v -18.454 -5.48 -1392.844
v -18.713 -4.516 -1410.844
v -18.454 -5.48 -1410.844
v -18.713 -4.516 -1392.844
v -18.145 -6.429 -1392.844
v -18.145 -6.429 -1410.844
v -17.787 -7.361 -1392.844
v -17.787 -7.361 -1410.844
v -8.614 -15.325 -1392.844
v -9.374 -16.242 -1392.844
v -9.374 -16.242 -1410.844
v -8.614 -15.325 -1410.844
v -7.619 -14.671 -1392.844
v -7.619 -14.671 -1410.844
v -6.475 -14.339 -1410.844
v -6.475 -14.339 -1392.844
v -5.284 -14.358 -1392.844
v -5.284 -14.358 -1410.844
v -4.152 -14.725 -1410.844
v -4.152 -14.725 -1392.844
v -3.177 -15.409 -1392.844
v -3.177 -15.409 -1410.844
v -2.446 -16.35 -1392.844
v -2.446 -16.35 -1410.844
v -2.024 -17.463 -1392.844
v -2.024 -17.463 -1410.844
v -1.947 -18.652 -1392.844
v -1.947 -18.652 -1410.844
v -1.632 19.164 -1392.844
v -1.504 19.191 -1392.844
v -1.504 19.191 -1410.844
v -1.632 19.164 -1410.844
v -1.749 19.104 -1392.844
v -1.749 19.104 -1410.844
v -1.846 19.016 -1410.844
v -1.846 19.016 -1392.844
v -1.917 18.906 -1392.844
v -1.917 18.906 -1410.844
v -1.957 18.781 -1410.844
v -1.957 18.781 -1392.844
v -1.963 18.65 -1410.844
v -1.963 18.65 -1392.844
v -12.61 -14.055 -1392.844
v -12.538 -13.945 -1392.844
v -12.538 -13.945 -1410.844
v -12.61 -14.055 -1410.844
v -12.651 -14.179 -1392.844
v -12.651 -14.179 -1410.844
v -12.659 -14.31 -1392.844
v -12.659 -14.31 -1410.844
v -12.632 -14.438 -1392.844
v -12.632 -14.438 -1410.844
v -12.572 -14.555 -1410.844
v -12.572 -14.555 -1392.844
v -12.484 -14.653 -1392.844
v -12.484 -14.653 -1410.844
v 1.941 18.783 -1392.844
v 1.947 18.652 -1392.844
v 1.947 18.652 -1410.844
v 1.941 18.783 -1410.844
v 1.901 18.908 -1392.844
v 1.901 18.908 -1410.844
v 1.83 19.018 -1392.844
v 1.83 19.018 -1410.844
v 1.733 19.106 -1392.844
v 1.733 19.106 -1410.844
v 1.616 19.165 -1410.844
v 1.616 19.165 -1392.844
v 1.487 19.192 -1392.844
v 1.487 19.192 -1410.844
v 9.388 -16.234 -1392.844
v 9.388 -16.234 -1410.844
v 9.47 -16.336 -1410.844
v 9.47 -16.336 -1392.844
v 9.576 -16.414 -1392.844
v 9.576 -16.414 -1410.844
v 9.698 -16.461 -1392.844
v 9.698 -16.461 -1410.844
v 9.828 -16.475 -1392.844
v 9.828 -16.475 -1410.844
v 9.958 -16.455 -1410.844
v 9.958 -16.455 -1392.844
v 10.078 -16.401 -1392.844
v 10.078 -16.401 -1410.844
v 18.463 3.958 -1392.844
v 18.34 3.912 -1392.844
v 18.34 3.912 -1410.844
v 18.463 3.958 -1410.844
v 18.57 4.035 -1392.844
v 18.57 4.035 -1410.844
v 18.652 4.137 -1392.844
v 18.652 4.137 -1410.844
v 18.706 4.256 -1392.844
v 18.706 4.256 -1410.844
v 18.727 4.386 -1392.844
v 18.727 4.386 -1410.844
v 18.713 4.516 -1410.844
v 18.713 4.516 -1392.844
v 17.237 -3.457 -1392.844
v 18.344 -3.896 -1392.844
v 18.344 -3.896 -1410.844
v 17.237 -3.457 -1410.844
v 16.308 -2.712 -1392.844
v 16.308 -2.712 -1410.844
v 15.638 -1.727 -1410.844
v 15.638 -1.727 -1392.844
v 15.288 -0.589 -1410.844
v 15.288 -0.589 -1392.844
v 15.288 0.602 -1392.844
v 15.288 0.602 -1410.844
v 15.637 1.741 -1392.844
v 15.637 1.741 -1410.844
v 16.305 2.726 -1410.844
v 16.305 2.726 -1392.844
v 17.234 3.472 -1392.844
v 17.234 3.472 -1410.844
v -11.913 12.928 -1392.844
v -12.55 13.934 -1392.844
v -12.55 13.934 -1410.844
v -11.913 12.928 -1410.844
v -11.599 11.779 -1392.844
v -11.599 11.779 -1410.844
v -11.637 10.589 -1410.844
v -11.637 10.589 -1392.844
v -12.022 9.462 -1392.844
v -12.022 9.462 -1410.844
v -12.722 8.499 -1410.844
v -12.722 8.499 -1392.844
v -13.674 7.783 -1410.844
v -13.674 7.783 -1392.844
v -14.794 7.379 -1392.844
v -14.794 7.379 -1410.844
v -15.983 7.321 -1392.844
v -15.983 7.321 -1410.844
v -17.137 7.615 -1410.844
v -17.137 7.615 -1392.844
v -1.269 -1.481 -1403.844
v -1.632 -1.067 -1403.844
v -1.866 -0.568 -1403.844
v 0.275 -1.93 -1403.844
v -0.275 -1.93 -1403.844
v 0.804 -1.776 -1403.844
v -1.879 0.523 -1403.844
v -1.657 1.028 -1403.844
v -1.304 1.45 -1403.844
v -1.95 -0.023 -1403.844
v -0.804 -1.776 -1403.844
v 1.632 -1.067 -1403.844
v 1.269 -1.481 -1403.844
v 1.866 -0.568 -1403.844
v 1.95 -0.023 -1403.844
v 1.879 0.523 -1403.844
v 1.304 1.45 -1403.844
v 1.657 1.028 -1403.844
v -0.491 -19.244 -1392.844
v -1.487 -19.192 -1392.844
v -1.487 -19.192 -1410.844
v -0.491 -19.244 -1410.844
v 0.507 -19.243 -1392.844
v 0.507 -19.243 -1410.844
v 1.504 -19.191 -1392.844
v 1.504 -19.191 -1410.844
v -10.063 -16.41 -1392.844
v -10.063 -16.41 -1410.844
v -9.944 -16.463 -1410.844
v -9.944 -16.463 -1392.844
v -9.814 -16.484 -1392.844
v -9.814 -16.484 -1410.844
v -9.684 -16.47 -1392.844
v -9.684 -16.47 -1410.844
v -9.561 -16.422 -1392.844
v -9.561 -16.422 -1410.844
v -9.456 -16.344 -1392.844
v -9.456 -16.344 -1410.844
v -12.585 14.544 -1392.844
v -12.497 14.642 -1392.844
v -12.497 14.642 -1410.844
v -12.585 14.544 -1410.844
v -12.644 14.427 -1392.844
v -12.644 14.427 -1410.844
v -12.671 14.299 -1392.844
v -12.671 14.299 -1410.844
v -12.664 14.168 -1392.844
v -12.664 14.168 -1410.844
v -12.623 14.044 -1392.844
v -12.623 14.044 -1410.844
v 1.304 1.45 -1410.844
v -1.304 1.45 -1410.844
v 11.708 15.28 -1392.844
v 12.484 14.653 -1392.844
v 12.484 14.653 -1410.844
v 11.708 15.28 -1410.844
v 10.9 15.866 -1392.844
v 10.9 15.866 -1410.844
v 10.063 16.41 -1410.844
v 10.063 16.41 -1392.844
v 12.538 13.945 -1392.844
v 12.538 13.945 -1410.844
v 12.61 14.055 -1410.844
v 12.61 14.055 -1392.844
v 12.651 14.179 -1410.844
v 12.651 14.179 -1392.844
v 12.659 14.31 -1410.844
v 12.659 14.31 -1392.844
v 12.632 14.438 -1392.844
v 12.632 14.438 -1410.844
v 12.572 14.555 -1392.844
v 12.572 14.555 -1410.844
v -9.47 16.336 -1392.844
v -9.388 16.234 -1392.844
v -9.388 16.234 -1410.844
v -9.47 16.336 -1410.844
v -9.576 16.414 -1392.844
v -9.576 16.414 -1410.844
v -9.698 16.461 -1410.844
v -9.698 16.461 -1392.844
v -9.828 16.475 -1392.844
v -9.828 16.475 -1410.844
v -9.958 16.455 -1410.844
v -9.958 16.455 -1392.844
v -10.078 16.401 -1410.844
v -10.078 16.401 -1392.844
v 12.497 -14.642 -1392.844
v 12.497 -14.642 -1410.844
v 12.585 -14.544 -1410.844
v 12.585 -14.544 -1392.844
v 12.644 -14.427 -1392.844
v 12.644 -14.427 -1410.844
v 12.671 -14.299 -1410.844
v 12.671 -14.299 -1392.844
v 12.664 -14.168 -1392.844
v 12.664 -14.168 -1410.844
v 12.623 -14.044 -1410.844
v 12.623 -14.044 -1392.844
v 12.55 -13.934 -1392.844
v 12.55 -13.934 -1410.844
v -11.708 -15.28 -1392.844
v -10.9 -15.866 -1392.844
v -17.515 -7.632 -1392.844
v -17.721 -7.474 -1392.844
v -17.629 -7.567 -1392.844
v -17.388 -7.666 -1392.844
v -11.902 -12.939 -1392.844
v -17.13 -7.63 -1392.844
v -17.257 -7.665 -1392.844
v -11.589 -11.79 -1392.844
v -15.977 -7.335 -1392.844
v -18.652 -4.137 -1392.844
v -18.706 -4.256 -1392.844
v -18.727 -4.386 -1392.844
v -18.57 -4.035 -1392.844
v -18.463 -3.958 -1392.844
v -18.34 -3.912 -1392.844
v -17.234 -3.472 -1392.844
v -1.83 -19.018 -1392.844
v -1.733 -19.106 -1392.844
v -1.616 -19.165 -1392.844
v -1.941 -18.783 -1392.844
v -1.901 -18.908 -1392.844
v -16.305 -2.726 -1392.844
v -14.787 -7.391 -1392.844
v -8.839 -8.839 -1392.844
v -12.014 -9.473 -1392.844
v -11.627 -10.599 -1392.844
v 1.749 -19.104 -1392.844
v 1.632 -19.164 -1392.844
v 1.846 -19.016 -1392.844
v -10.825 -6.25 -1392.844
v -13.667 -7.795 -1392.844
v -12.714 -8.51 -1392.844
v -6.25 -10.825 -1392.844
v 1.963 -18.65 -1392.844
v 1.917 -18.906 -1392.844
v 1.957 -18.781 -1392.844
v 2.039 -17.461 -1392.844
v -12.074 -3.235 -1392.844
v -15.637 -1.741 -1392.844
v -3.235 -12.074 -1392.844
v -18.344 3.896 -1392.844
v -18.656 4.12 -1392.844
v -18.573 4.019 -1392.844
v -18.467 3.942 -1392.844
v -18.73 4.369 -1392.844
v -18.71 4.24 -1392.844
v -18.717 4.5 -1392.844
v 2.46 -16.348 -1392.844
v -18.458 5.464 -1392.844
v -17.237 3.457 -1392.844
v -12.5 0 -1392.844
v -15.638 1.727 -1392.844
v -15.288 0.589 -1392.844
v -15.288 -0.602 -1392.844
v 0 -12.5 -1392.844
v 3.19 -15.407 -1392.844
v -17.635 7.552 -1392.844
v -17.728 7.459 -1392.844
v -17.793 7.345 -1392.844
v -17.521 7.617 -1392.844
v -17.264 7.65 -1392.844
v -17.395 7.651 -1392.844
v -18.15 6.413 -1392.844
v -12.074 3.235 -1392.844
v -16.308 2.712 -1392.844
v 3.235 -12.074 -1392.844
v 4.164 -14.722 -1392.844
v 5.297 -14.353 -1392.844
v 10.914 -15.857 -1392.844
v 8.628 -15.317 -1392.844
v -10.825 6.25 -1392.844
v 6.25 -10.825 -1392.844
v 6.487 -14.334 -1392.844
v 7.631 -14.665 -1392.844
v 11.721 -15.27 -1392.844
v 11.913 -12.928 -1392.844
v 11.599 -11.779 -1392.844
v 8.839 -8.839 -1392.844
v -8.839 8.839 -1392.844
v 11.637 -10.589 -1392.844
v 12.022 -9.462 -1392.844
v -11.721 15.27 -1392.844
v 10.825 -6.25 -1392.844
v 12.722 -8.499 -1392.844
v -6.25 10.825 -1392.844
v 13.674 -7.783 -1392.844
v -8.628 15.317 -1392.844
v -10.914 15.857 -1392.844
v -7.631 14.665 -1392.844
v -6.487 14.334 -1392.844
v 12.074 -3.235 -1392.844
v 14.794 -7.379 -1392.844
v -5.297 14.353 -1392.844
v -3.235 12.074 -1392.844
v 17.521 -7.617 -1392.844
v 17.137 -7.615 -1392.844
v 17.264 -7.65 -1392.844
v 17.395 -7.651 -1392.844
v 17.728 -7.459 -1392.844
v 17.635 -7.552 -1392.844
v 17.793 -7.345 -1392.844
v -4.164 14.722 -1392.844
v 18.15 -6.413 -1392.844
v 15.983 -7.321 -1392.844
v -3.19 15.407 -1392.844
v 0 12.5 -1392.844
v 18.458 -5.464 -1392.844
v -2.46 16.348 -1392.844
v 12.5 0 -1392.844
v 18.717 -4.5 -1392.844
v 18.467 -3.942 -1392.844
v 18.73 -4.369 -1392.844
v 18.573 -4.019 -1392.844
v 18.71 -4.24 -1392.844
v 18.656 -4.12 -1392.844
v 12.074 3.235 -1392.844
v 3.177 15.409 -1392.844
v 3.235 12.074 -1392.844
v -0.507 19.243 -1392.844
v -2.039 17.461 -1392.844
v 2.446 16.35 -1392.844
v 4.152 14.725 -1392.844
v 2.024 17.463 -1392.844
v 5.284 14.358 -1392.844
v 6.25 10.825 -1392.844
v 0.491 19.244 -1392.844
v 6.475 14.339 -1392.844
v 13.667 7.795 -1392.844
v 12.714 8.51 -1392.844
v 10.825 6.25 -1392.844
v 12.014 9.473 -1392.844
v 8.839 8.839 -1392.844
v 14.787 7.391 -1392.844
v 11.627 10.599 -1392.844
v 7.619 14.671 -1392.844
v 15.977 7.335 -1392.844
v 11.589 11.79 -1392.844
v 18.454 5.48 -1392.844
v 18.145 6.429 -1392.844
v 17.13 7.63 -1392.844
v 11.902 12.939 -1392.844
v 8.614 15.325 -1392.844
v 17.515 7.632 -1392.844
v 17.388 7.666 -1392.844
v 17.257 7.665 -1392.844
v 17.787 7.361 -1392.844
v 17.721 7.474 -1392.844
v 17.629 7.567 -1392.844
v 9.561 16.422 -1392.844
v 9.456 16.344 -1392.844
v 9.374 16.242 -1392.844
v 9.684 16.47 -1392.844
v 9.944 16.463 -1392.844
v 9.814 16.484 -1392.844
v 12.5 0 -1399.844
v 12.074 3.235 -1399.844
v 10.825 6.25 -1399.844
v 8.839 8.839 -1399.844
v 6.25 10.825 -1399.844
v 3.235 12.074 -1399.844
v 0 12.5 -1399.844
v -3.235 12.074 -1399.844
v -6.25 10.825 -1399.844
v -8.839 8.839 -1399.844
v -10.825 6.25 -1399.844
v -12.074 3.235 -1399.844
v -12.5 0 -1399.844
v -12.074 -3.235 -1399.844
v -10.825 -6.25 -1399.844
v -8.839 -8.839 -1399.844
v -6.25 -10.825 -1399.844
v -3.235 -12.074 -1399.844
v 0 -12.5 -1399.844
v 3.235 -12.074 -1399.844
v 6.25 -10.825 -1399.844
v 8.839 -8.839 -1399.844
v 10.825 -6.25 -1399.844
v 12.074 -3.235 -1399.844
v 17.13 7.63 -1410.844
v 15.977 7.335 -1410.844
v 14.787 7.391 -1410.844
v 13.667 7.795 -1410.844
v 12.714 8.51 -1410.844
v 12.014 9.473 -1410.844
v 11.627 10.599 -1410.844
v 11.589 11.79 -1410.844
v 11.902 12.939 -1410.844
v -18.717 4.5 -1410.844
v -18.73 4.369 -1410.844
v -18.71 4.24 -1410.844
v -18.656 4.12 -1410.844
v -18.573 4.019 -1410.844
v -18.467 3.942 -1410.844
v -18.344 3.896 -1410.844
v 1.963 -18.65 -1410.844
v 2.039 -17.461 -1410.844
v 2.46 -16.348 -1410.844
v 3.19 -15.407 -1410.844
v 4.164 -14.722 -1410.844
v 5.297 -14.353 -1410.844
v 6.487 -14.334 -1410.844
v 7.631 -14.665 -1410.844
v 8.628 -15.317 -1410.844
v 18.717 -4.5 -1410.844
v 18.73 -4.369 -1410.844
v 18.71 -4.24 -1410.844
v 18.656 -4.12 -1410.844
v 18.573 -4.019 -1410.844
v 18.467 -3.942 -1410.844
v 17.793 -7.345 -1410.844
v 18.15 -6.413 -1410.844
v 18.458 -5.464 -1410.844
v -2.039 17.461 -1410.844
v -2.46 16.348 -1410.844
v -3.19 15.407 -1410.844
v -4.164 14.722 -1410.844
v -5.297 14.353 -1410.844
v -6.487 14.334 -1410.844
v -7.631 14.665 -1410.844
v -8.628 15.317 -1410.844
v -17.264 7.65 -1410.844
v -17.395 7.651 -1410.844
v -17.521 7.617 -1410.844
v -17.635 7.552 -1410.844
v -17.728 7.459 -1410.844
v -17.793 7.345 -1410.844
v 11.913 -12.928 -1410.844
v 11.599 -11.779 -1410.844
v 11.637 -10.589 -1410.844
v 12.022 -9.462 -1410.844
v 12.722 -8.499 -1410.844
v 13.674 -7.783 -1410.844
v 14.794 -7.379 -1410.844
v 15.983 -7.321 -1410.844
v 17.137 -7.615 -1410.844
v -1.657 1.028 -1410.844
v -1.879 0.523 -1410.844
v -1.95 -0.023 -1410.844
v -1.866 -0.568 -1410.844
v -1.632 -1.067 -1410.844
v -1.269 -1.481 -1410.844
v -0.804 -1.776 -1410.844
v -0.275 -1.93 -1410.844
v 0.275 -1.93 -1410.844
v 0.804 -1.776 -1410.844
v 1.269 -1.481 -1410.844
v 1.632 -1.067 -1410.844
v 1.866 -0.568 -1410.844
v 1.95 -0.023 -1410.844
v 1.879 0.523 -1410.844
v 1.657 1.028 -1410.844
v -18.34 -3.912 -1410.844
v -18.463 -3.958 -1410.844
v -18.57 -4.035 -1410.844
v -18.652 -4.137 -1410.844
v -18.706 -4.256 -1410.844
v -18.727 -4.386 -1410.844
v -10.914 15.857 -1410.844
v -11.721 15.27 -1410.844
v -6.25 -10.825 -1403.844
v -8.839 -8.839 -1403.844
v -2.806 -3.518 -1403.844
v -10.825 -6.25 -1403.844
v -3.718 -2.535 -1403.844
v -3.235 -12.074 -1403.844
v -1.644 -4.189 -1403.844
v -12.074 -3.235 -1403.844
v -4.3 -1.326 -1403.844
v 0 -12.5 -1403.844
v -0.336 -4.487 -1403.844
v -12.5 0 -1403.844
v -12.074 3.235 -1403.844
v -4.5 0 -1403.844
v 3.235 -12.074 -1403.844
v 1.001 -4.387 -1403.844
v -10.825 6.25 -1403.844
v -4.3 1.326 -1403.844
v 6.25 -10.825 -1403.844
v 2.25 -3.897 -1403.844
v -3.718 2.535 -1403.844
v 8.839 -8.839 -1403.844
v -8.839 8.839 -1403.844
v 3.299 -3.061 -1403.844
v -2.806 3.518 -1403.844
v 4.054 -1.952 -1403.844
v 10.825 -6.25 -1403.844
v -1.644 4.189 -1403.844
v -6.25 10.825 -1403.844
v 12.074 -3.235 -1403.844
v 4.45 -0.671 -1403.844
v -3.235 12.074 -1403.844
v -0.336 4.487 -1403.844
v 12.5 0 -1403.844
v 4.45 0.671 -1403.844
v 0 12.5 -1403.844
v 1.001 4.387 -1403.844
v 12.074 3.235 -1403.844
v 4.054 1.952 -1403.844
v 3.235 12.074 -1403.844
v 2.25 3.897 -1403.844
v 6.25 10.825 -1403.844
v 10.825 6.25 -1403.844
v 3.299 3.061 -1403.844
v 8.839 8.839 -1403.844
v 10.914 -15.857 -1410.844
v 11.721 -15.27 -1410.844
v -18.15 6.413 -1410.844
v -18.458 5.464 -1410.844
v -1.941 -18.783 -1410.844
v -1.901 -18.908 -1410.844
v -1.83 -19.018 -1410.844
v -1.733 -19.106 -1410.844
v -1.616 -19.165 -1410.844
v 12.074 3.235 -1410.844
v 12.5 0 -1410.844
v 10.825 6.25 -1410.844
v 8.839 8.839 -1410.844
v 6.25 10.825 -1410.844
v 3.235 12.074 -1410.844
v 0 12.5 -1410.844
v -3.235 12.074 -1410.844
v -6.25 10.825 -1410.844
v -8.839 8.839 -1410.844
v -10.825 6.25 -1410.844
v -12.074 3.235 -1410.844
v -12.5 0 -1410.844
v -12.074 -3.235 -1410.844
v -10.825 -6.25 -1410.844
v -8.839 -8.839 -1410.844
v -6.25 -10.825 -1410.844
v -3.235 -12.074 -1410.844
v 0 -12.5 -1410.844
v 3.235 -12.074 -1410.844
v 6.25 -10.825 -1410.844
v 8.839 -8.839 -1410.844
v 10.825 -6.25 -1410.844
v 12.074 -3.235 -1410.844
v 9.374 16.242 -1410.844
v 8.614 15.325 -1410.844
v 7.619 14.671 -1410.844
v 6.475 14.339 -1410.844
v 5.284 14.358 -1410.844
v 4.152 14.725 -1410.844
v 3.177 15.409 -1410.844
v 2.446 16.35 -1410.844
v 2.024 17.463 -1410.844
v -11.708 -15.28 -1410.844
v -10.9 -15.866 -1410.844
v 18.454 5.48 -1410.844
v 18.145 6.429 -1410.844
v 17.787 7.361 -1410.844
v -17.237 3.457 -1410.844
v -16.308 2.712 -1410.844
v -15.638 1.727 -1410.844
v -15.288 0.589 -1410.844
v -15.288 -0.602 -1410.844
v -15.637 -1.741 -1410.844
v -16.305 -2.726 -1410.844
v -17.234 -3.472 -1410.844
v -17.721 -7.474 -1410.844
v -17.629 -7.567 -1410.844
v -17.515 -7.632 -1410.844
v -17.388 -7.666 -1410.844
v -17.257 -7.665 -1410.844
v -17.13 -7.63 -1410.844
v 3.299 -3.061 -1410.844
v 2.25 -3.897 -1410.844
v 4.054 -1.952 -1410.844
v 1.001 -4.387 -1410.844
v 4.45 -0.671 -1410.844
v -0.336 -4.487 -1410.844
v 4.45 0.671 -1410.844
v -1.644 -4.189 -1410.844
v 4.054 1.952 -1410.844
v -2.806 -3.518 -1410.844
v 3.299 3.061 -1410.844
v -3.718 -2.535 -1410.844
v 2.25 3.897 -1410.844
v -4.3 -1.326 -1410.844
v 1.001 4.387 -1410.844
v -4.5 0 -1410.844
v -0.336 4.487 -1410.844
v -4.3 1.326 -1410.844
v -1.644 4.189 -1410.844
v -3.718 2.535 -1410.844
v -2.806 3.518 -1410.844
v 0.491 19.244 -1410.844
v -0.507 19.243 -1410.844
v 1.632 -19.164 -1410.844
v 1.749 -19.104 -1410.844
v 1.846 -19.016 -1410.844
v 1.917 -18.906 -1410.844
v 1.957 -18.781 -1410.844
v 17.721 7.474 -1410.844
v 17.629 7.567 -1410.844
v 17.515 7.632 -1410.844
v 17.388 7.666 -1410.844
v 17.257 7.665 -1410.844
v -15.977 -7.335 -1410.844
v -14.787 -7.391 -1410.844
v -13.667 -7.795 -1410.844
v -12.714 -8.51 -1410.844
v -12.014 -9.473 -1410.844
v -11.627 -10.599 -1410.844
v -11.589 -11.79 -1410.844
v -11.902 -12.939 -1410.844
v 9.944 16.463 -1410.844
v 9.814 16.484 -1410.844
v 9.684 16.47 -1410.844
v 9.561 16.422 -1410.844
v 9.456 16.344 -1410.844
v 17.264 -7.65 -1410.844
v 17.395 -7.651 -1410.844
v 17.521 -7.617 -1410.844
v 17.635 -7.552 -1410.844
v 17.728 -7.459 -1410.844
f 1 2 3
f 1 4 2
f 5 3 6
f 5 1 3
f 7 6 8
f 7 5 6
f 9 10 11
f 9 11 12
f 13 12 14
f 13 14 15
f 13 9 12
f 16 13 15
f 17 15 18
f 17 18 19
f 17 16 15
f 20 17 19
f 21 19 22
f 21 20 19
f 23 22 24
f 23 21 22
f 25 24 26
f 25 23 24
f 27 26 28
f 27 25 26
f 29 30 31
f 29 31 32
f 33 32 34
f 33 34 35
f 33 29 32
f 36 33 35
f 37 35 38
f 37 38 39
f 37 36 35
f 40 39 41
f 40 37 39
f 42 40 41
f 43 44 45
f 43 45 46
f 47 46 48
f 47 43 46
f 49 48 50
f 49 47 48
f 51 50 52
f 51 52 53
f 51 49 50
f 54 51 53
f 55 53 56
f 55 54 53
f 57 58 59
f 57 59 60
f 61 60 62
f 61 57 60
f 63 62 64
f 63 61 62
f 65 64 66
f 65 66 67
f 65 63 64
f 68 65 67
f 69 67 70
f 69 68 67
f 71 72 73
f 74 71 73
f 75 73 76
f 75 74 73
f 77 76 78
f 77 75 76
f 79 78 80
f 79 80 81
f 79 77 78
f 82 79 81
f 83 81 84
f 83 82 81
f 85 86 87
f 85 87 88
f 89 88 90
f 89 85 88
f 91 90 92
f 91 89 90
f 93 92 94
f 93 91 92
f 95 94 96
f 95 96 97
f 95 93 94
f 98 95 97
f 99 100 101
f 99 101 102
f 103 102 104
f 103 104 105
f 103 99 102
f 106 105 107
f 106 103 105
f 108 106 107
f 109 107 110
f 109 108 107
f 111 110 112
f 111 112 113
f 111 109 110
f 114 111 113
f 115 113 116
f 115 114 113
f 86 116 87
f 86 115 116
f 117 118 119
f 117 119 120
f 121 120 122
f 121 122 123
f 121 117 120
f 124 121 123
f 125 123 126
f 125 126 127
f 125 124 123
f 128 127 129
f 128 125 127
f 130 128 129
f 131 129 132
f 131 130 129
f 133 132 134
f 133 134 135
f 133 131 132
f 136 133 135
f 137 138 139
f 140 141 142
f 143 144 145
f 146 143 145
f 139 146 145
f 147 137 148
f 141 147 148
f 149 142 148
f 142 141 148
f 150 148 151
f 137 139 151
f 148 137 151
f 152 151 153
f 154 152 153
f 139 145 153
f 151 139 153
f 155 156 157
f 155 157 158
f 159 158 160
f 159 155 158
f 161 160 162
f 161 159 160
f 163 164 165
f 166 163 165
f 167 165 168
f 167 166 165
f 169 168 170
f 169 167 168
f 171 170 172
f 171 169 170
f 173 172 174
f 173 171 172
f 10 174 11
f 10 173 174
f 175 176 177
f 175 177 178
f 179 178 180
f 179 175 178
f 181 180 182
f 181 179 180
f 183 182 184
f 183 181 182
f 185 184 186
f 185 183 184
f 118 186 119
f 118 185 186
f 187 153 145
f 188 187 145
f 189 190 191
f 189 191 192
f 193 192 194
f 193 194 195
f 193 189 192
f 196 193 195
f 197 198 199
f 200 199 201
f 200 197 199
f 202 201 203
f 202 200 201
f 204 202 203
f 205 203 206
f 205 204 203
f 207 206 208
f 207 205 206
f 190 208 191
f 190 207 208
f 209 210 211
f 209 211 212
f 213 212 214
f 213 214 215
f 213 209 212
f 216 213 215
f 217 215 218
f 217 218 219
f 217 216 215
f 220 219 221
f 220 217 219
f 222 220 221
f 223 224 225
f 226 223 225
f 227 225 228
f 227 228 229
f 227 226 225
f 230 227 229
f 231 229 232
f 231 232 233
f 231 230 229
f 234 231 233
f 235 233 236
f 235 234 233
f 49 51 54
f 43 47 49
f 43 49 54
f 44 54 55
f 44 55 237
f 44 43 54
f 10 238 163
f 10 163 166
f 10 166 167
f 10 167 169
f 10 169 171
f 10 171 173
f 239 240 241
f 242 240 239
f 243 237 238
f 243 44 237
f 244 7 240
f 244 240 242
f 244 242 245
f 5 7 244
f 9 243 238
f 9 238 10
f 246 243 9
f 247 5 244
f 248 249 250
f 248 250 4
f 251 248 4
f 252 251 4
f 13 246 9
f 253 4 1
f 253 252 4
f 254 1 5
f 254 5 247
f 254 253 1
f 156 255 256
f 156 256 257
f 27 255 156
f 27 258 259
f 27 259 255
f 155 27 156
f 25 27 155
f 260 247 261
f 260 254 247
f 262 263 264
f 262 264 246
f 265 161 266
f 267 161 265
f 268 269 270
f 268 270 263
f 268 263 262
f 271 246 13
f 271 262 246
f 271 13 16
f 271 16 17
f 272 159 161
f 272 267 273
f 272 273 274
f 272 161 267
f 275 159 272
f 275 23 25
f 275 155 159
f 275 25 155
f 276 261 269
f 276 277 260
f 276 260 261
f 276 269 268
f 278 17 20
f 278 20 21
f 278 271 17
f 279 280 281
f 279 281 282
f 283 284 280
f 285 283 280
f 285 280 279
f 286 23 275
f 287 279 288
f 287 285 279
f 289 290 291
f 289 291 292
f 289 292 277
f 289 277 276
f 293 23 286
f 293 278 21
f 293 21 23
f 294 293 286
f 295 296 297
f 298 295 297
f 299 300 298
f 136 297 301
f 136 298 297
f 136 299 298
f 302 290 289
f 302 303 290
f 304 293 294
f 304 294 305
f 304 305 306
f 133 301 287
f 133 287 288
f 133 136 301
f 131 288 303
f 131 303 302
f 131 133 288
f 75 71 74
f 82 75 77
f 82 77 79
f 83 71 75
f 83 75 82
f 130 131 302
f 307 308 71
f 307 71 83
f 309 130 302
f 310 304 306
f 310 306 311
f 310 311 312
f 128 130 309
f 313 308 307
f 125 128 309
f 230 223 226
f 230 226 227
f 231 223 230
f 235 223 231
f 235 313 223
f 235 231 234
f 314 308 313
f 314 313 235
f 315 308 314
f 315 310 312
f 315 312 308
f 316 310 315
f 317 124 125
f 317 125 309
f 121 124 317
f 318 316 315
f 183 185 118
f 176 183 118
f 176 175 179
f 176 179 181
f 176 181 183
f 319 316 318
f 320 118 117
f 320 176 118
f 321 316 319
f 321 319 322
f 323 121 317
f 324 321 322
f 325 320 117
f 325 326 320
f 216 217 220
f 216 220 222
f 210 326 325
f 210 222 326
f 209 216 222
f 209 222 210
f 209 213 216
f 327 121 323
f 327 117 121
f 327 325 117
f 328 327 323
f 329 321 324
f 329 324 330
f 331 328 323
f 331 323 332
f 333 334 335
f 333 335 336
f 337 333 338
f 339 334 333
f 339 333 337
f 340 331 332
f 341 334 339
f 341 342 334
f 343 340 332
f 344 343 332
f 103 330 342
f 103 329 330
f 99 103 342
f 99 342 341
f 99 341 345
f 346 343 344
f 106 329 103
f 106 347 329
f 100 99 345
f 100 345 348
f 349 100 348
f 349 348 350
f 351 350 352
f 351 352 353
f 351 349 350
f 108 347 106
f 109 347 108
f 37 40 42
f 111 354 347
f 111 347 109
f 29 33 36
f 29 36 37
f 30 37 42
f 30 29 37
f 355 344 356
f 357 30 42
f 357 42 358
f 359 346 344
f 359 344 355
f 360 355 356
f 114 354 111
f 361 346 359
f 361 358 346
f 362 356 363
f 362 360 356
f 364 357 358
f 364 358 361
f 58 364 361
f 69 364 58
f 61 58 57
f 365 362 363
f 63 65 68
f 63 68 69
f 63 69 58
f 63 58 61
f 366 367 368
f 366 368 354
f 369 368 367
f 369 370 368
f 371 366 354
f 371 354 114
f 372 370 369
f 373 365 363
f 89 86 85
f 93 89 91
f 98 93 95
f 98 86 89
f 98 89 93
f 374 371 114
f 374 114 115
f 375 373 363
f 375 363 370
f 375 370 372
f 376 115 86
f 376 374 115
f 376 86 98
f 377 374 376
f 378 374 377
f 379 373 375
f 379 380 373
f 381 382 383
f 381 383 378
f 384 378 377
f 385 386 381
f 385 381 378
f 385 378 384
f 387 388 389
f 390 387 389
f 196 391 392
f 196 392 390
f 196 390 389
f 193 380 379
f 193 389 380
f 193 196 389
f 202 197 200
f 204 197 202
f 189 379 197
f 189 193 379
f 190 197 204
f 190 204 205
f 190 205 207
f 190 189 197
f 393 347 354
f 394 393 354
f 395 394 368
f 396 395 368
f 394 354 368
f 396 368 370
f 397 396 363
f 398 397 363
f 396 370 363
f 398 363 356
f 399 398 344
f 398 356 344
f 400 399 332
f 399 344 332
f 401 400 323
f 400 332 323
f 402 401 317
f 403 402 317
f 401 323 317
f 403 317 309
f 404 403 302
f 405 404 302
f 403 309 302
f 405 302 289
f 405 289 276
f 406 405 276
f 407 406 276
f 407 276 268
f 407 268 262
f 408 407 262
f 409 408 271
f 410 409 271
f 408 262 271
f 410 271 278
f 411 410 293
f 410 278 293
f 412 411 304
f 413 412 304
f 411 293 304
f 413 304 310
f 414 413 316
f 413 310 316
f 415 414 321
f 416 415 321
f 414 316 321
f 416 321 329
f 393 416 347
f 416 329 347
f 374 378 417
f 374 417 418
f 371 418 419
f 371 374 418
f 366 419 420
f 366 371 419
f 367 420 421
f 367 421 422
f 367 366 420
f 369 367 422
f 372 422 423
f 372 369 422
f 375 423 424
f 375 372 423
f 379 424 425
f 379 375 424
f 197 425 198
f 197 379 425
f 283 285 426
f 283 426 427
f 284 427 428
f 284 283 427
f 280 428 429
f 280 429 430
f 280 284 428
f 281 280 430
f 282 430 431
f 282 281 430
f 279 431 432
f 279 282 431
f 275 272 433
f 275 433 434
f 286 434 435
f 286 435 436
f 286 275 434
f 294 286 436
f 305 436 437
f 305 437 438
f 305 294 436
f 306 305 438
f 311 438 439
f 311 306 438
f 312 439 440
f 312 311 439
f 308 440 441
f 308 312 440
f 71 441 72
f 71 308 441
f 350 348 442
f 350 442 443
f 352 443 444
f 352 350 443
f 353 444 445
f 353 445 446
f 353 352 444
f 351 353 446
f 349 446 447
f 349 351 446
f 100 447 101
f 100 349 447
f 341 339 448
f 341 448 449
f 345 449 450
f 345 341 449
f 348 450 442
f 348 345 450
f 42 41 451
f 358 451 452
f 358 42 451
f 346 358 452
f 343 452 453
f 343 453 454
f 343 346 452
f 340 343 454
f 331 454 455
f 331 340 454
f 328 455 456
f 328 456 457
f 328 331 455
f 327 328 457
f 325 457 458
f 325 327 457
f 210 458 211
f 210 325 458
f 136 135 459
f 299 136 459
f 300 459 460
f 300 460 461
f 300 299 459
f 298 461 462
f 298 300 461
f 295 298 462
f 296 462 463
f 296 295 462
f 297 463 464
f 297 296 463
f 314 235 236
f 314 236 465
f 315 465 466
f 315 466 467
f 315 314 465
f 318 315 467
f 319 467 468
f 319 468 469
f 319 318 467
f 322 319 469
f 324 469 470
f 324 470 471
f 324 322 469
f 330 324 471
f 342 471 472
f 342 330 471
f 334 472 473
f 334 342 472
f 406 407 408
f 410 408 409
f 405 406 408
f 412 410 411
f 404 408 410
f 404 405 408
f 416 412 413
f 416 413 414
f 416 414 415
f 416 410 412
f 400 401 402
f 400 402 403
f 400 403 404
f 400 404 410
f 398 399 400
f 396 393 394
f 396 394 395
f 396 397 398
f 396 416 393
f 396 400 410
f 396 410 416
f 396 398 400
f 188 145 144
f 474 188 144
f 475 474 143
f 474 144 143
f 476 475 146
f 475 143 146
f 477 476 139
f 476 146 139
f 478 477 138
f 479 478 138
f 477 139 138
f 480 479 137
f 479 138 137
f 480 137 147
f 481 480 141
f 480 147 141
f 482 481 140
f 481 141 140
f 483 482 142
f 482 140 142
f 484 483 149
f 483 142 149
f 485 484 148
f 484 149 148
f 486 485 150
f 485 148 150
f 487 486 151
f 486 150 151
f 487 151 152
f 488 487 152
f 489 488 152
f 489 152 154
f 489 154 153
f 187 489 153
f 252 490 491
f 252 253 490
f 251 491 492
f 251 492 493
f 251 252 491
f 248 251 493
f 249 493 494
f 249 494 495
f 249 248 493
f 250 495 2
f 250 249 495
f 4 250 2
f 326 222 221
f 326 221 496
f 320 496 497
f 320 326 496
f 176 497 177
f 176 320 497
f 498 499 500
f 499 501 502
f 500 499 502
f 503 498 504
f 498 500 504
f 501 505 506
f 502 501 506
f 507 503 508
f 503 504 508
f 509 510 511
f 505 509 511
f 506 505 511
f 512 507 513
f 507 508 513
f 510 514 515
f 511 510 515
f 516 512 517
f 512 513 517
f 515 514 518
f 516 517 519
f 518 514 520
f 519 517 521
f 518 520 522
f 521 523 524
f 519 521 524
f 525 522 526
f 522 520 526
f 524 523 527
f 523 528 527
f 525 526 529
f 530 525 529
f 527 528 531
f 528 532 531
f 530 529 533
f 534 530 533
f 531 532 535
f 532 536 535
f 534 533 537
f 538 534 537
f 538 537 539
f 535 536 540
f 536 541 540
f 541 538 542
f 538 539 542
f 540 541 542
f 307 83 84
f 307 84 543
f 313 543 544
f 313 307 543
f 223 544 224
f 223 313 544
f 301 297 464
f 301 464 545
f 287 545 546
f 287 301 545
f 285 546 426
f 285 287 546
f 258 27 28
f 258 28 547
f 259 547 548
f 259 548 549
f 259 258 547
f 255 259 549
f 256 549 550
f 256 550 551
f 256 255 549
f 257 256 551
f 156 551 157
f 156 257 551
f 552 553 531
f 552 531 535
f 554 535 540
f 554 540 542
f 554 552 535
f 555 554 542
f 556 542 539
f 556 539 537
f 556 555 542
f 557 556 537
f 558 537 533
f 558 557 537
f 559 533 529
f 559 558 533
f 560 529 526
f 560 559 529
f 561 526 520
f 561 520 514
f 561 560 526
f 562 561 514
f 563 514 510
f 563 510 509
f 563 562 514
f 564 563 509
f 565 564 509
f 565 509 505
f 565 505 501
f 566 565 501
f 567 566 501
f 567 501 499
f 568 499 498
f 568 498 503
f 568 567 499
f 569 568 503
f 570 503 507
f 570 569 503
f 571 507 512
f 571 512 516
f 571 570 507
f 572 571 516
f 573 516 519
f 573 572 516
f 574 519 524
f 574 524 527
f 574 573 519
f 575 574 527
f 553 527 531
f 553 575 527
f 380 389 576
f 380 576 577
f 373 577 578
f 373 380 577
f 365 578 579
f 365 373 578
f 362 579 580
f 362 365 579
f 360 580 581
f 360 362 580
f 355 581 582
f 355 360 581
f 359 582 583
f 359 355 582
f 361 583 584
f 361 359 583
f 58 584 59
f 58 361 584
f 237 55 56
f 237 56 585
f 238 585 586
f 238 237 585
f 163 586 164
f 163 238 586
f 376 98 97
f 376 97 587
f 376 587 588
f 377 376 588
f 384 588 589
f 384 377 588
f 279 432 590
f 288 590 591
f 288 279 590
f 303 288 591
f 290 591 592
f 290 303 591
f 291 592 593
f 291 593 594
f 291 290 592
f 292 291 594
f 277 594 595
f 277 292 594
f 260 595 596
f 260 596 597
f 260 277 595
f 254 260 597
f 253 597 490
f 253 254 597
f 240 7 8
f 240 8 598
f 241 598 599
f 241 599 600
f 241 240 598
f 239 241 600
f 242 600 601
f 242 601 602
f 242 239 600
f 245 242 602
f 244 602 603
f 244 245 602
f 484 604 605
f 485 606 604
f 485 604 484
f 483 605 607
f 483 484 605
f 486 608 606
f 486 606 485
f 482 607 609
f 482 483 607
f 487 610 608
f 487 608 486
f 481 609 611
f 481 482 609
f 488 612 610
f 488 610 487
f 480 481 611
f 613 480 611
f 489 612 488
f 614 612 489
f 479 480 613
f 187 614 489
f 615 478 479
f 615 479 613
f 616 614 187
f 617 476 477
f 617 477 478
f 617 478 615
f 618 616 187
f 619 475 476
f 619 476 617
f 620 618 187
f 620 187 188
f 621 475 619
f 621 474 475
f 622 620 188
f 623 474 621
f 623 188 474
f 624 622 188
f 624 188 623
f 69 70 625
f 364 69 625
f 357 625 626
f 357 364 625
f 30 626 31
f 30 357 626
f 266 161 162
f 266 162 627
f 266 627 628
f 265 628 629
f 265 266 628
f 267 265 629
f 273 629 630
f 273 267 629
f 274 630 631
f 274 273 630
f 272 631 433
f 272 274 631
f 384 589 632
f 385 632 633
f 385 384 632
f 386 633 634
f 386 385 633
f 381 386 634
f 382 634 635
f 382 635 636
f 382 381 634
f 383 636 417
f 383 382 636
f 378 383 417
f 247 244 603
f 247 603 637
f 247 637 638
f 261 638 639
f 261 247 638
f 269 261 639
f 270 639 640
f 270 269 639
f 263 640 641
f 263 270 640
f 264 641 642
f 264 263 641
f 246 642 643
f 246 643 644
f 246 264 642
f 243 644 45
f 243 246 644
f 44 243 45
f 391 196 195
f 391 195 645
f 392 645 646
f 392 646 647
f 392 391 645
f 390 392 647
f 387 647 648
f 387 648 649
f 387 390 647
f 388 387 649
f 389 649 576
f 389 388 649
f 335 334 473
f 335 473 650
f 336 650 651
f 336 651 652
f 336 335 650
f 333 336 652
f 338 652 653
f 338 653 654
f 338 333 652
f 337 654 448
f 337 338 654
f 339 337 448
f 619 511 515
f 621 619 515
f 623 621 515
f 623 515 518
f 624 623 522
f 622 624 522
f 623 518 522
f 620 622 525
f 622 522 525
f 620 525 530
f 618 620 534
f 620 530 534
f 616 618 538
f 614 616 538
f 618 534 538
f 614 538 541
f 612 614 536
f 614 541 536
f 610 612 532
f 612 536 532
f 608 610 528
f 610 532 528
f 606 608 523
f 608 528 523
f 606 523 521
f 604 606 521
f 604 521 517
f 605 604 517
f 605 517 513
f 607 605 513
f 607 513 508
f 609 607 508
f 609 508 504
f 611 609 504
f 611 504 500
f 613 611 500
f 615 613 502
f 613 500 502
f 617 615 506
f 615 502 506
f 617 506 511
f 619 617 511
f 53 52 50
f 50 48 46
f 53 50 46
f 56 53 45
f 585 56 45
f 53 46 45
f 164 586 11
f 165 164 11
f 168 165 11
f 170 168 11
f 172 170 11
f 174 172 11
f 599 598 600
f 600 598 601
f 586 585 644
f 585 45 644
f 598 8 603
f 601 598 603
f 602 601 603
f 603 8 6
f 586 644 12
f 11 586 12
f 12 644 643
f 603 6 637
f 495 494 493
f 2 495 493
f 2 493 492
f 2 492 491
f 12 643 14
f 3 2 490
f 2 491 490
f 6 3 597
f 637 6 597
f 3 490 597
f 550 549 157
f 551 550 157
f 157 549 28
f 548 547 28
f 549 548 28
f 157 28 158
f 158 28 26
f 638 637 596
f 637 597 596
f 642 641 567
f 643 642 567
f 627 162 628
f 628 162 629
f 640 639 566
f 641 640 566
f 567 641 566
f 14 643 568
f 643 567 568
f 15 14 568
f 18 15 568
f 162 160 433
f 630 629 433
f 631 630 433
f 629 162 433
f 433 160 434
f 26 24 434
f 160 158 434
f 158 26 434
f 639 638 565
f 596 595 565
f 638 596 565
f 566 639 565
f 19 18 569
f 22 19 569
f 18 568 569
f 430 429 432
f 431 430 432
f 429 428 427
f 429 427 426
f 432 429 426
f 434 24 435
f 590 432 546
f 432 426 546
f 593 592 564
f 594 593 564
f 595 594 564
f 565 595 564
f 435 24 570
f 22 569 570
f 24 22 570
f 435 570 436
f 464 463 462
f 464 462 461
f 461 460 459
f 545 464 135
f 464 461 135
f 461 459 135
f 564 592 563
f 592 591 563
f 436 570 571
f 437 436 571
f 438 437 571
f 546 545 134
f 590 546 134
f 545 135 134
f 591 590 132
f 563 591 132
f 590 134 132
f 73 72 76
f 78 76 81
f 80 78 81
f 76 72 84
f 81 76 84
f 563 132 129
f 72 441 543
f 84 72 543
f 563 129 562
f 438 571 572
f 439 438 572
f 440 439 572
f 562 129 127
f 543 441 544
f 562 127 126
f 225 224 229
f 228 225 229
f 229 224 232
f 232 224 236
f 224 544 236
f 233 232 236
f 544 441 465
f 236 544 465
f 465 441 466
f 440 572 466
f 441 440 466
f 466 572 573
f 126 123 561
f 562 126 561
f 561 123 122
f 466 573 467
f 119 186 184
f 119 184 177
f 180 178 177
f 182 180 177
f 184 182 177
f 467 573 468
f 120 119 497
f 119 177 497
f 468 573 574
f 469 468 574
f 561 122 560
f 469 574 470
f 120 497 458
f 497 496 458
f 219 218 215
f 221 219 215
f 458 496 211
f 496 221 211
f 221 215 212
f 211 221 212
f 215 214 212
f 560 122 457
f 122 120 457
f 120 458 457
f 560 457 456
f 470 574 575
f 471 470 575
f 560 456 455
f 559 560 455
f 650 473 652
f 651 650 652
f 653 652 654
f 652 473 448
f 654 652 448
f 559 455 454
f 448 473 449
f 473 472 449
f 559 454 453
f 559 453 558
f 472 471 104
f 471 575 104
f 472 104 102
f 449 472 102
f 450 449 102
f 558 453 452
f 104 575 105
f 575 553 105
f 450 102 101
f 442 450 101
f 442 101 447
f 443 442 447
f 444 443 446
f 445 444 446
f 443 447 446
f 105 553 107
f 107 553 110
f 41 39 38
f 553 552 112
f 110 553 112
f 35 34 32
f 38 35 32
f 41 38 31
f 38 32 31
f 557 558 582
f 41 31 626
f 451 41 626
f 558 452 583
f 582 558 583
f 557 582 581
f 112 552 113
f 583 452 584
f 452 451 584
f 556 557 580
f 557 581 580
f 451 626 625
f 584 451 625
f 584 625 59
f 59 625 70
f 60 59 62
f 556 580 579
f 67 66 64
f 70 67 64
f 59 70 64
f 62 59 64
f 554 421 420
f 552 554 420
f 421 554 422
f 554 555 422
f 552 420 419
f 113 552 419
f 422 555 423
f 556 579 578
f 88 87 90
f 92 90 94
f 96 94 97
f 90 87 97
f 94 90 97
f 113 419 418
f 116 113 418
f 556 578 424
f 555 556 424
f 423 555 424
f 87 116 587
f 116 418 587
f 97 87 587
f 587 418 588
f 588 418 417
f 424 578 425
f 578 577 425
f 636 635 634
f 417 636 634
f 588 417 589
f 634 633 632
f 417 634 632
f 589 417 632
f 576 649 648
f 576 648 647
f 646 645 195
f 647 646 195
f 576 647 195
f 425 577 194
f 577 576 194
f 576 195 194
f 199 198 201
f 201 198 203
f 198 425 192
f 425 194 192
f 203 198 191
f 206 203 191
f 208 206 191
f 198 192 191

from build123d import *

# Parameters (mm, degrees)
SPROKET_DEPTH       = 9
SKETCH3_R           = 12.5
CUT_EXTRUDE1_DEPTH  = 7
SKETCH4_R           = 4.5
BOSS_EXTRUDE1_DEPTH = 7


with BuildPart() as part:
    # Sprocket → Sproket (new body)
    with BuildSketch(Plane(origin=(-521.333895642, -864.335014518, -1401.843992528), x_dir=(1, 0, 0), z_dir=(0, 0, 1))):
        with BuildLine():
            ThreePointArc((502.621153074, 859.818847383), (503.02864119, 858.378492088), (503.546815178, 856.974153932))
            ThreePointArc((503.546815178, 856.974153932), (503.819037022, 856.702761655), (504.203425444, 856.704771932))
            ThreePointArc((504.203425444, 856.704771932), (509.005673001, 855.369858884), (508.795597259, 850.389955006))
            ThreePointArc((508.795597259, 850.389955006), (508.675219652, 850.024896474), (508.849505331, 849.682284445))
            ThreePointArc((508.849505331, 849.682284445), (510.025789743, 848.756528039), (511.270450563, 847.924969632))
            ThreePointArc((511.270450563, 847.924969632), (511.650203039, 847.865416653), (511.959998194, 848.092980848))
            ThreePointArc((511.959998194, 848.092980848), (516.629740281, 849.835703798), (519.386899492, 845.683397507))
            ThreePointArc((519.386899492, 845.683397507), (519.504087984, 845.317302769), (519.846470359, 845.142566367))
            ThreePointArc((519.846470359, 845.142566367), (521.342250401, 845.085016331), (522.837979924, 845.143864722))
            ThreePointArc((522.837979924, 845.143864722), (523.180210493, 845.318898255), (523.297081161, 845.685094579))
            ThreePointArc((523.297081161, 845.685094579), (526.05063502, 849.839792593), (530.721888079, 848.101123761))
            ThreePointArc((530.721888079, 848.101123761), (531.031880649, 847.873828563), (531.411581288, 847.933711155))
            ThreePointArc((531.411581288, 847.933711155), (532.655519825, 848.766349647), (533.831000211, 849.693126751))
            ThreePointArc((533.831000211, 849.693126751), (534.004988429, 850.035889936), (533.884293987, 850.400843839))
            ThreePointArc((533.884293987, 850.400843839), (533.669895633, 855.380563489), (538.470982641, 856.719644514))
            ThreePointArc((538.470982641, 856.719644514), (538.855372663, 856.717967897), (539.127358829, 856.989596368))
            ThreePointArc((539.127358829, 856.989596368), (539.644313618, 858.394383784), (540.050551314, 859.835092247))
            ThreePointArc((540.050551314, 859.835092247), (539.989839594, 860.214661197), (539.677681217, 860.438972694))
            ThreePointArc((539.677681217, 860.438972694), (536.577223534, 864.341630328), (539.674292437, 868.246977772))
            ThreePointArc((539.674292437, 868.246977772), (539.986255988, 868.471560146), (540.046638209, 868.851181652))
            ThreePointArc((540.046638209, 868.851181652), (539.639150093, 870.291536947), (539.120976106, 871.695875104))
            ThreePointArc((539.120976106, 871.695875104), (538.848754261, 871.967267381), (538.464365839, 871.965257104))
            ThreePointArc((538.464365839, 871.965257104), (533.662118282, 873.300170152), (533.872194024, 878.280074029))
            ThreePointArc((533.872194024, 878.280074029), (533.992571631, 878.645132562), (533.818285952, 878.98774459))
            ThreePointArc((533.818285952, 878.98774459), (532.642001541, 879.913500997), (531.39734072, 880.745059403))
            ThreePointArc((531.39734072, 880.745059403), (531.017588244, 880.804612382), (530.70779309, 880.577048188))
            ThreePointArc((530.70779309, 880.577048188), (526.038051002, 878.834325238), (523.280891791, 882.986631528))
            ThreePointArc((523.280891791, 882.986631528), (523.163703299, 883.352726267), (522.821320924, 883.527462669))
            ThreePointArc((522.821320924, 883.527462669), (521.325540883, 883.585012705), (519.829811359, 883.526164313))
            ThreePointArc((519.829811359, 883.526164313), (519.48758079, 883.35113078), (519.370710122, 882.984934457))
            ThreePointArc((519.370710122, 882.984934457), (516.617156263, 878.830236442), (511.945903204, 880.568905275))
            ThreePointArc((511.945903204, 880.568905275), (511.635910634, 880.796200472), (511.256209995, 880.736317881))
            ThreePointArc((511.256209995, 880.736317881), (510.012271459, 879.903679389), (508.836791072, 878.976902284))
            ThreePointArc((508.836791072, 878.976902284), (508.662802855, 878.6341391), (508.783497297, 878.269185196))
            ThreePointArc((508.783497297, 878.269185196), (508.99789565, 873.289465546), (504.196808642, 871.950384521))
            ThreePointArc((504.196808642, 871.950384521), (503.81241862, 871.952061138), (503.540432454, 871.680432668))
            ThreePointArc((503.540432454, 871.680432668), (503.023477665, 870.275645251), (502.617239969, 868.834936788))
            ThreePointArc((502.617239969, 868.834936788), (502.677951689, 868.455367839), (502.990110067, 868.231056341))
            ThreePointArc((502.990110067, 868.231056341), (506.090567749, 864.328398708), (502.993498846, 860.423051264))
            ThreePointArc((502.993498846, 860.423051264), (502.681535295, 860.198468889), (502.621153074, 859.818847383))
        make_face()
    sproket = extrude(amount=SPROKET_DEPTH)

    # Sketch3 → Cut-Extrude1 (cut)
    with BuildSketch(Plane.XY.offset(-1392.843992528)):
        Circle(SKETCH3_R)
    cut_extrude1 = extrude(amount=-CUT_EXTRUDE1_DEPTH, mode=Mode.SUBTRACT)

    # Mirror1: Sproket, Cut-Extrude1 across plane
    add(sproket.mirror(Plane(origin=(9.113348653, 2.199432046, -1401.843992528), x_dir=(1, 0, 0), z_dir=(0, 0, 1))))
    add(cut_extrude1.mirror(Plane(origin=(9.113348653, 2.199432046, -1401.843992528), x_dir=(1, 0, 0), z_dir=(0, 0, 1))), mode=Mode.SUBTRACT)

    # Sketch4 → Boss-Extrude1 (add)
    with BuildSketch(Plane(origin=(0, 0, -1403.843992528), x_dir=(-1, 0, 0), z_dir=(0, 0, -1))):
        Circle(SKETCH4_R)
        with BuildLine():
            Line((-1.303840481, 1.45), (1.303840481, 1.45))
            ThreePointArc((1.303840481, 1.45), (0, -1.95), (-1.303840481, 1.45))
        make_face(mode=Mode.SUBTRACT)
    extrude(amount=BOSS_EXTRUDE1_DEPTH)


solid = part.part
